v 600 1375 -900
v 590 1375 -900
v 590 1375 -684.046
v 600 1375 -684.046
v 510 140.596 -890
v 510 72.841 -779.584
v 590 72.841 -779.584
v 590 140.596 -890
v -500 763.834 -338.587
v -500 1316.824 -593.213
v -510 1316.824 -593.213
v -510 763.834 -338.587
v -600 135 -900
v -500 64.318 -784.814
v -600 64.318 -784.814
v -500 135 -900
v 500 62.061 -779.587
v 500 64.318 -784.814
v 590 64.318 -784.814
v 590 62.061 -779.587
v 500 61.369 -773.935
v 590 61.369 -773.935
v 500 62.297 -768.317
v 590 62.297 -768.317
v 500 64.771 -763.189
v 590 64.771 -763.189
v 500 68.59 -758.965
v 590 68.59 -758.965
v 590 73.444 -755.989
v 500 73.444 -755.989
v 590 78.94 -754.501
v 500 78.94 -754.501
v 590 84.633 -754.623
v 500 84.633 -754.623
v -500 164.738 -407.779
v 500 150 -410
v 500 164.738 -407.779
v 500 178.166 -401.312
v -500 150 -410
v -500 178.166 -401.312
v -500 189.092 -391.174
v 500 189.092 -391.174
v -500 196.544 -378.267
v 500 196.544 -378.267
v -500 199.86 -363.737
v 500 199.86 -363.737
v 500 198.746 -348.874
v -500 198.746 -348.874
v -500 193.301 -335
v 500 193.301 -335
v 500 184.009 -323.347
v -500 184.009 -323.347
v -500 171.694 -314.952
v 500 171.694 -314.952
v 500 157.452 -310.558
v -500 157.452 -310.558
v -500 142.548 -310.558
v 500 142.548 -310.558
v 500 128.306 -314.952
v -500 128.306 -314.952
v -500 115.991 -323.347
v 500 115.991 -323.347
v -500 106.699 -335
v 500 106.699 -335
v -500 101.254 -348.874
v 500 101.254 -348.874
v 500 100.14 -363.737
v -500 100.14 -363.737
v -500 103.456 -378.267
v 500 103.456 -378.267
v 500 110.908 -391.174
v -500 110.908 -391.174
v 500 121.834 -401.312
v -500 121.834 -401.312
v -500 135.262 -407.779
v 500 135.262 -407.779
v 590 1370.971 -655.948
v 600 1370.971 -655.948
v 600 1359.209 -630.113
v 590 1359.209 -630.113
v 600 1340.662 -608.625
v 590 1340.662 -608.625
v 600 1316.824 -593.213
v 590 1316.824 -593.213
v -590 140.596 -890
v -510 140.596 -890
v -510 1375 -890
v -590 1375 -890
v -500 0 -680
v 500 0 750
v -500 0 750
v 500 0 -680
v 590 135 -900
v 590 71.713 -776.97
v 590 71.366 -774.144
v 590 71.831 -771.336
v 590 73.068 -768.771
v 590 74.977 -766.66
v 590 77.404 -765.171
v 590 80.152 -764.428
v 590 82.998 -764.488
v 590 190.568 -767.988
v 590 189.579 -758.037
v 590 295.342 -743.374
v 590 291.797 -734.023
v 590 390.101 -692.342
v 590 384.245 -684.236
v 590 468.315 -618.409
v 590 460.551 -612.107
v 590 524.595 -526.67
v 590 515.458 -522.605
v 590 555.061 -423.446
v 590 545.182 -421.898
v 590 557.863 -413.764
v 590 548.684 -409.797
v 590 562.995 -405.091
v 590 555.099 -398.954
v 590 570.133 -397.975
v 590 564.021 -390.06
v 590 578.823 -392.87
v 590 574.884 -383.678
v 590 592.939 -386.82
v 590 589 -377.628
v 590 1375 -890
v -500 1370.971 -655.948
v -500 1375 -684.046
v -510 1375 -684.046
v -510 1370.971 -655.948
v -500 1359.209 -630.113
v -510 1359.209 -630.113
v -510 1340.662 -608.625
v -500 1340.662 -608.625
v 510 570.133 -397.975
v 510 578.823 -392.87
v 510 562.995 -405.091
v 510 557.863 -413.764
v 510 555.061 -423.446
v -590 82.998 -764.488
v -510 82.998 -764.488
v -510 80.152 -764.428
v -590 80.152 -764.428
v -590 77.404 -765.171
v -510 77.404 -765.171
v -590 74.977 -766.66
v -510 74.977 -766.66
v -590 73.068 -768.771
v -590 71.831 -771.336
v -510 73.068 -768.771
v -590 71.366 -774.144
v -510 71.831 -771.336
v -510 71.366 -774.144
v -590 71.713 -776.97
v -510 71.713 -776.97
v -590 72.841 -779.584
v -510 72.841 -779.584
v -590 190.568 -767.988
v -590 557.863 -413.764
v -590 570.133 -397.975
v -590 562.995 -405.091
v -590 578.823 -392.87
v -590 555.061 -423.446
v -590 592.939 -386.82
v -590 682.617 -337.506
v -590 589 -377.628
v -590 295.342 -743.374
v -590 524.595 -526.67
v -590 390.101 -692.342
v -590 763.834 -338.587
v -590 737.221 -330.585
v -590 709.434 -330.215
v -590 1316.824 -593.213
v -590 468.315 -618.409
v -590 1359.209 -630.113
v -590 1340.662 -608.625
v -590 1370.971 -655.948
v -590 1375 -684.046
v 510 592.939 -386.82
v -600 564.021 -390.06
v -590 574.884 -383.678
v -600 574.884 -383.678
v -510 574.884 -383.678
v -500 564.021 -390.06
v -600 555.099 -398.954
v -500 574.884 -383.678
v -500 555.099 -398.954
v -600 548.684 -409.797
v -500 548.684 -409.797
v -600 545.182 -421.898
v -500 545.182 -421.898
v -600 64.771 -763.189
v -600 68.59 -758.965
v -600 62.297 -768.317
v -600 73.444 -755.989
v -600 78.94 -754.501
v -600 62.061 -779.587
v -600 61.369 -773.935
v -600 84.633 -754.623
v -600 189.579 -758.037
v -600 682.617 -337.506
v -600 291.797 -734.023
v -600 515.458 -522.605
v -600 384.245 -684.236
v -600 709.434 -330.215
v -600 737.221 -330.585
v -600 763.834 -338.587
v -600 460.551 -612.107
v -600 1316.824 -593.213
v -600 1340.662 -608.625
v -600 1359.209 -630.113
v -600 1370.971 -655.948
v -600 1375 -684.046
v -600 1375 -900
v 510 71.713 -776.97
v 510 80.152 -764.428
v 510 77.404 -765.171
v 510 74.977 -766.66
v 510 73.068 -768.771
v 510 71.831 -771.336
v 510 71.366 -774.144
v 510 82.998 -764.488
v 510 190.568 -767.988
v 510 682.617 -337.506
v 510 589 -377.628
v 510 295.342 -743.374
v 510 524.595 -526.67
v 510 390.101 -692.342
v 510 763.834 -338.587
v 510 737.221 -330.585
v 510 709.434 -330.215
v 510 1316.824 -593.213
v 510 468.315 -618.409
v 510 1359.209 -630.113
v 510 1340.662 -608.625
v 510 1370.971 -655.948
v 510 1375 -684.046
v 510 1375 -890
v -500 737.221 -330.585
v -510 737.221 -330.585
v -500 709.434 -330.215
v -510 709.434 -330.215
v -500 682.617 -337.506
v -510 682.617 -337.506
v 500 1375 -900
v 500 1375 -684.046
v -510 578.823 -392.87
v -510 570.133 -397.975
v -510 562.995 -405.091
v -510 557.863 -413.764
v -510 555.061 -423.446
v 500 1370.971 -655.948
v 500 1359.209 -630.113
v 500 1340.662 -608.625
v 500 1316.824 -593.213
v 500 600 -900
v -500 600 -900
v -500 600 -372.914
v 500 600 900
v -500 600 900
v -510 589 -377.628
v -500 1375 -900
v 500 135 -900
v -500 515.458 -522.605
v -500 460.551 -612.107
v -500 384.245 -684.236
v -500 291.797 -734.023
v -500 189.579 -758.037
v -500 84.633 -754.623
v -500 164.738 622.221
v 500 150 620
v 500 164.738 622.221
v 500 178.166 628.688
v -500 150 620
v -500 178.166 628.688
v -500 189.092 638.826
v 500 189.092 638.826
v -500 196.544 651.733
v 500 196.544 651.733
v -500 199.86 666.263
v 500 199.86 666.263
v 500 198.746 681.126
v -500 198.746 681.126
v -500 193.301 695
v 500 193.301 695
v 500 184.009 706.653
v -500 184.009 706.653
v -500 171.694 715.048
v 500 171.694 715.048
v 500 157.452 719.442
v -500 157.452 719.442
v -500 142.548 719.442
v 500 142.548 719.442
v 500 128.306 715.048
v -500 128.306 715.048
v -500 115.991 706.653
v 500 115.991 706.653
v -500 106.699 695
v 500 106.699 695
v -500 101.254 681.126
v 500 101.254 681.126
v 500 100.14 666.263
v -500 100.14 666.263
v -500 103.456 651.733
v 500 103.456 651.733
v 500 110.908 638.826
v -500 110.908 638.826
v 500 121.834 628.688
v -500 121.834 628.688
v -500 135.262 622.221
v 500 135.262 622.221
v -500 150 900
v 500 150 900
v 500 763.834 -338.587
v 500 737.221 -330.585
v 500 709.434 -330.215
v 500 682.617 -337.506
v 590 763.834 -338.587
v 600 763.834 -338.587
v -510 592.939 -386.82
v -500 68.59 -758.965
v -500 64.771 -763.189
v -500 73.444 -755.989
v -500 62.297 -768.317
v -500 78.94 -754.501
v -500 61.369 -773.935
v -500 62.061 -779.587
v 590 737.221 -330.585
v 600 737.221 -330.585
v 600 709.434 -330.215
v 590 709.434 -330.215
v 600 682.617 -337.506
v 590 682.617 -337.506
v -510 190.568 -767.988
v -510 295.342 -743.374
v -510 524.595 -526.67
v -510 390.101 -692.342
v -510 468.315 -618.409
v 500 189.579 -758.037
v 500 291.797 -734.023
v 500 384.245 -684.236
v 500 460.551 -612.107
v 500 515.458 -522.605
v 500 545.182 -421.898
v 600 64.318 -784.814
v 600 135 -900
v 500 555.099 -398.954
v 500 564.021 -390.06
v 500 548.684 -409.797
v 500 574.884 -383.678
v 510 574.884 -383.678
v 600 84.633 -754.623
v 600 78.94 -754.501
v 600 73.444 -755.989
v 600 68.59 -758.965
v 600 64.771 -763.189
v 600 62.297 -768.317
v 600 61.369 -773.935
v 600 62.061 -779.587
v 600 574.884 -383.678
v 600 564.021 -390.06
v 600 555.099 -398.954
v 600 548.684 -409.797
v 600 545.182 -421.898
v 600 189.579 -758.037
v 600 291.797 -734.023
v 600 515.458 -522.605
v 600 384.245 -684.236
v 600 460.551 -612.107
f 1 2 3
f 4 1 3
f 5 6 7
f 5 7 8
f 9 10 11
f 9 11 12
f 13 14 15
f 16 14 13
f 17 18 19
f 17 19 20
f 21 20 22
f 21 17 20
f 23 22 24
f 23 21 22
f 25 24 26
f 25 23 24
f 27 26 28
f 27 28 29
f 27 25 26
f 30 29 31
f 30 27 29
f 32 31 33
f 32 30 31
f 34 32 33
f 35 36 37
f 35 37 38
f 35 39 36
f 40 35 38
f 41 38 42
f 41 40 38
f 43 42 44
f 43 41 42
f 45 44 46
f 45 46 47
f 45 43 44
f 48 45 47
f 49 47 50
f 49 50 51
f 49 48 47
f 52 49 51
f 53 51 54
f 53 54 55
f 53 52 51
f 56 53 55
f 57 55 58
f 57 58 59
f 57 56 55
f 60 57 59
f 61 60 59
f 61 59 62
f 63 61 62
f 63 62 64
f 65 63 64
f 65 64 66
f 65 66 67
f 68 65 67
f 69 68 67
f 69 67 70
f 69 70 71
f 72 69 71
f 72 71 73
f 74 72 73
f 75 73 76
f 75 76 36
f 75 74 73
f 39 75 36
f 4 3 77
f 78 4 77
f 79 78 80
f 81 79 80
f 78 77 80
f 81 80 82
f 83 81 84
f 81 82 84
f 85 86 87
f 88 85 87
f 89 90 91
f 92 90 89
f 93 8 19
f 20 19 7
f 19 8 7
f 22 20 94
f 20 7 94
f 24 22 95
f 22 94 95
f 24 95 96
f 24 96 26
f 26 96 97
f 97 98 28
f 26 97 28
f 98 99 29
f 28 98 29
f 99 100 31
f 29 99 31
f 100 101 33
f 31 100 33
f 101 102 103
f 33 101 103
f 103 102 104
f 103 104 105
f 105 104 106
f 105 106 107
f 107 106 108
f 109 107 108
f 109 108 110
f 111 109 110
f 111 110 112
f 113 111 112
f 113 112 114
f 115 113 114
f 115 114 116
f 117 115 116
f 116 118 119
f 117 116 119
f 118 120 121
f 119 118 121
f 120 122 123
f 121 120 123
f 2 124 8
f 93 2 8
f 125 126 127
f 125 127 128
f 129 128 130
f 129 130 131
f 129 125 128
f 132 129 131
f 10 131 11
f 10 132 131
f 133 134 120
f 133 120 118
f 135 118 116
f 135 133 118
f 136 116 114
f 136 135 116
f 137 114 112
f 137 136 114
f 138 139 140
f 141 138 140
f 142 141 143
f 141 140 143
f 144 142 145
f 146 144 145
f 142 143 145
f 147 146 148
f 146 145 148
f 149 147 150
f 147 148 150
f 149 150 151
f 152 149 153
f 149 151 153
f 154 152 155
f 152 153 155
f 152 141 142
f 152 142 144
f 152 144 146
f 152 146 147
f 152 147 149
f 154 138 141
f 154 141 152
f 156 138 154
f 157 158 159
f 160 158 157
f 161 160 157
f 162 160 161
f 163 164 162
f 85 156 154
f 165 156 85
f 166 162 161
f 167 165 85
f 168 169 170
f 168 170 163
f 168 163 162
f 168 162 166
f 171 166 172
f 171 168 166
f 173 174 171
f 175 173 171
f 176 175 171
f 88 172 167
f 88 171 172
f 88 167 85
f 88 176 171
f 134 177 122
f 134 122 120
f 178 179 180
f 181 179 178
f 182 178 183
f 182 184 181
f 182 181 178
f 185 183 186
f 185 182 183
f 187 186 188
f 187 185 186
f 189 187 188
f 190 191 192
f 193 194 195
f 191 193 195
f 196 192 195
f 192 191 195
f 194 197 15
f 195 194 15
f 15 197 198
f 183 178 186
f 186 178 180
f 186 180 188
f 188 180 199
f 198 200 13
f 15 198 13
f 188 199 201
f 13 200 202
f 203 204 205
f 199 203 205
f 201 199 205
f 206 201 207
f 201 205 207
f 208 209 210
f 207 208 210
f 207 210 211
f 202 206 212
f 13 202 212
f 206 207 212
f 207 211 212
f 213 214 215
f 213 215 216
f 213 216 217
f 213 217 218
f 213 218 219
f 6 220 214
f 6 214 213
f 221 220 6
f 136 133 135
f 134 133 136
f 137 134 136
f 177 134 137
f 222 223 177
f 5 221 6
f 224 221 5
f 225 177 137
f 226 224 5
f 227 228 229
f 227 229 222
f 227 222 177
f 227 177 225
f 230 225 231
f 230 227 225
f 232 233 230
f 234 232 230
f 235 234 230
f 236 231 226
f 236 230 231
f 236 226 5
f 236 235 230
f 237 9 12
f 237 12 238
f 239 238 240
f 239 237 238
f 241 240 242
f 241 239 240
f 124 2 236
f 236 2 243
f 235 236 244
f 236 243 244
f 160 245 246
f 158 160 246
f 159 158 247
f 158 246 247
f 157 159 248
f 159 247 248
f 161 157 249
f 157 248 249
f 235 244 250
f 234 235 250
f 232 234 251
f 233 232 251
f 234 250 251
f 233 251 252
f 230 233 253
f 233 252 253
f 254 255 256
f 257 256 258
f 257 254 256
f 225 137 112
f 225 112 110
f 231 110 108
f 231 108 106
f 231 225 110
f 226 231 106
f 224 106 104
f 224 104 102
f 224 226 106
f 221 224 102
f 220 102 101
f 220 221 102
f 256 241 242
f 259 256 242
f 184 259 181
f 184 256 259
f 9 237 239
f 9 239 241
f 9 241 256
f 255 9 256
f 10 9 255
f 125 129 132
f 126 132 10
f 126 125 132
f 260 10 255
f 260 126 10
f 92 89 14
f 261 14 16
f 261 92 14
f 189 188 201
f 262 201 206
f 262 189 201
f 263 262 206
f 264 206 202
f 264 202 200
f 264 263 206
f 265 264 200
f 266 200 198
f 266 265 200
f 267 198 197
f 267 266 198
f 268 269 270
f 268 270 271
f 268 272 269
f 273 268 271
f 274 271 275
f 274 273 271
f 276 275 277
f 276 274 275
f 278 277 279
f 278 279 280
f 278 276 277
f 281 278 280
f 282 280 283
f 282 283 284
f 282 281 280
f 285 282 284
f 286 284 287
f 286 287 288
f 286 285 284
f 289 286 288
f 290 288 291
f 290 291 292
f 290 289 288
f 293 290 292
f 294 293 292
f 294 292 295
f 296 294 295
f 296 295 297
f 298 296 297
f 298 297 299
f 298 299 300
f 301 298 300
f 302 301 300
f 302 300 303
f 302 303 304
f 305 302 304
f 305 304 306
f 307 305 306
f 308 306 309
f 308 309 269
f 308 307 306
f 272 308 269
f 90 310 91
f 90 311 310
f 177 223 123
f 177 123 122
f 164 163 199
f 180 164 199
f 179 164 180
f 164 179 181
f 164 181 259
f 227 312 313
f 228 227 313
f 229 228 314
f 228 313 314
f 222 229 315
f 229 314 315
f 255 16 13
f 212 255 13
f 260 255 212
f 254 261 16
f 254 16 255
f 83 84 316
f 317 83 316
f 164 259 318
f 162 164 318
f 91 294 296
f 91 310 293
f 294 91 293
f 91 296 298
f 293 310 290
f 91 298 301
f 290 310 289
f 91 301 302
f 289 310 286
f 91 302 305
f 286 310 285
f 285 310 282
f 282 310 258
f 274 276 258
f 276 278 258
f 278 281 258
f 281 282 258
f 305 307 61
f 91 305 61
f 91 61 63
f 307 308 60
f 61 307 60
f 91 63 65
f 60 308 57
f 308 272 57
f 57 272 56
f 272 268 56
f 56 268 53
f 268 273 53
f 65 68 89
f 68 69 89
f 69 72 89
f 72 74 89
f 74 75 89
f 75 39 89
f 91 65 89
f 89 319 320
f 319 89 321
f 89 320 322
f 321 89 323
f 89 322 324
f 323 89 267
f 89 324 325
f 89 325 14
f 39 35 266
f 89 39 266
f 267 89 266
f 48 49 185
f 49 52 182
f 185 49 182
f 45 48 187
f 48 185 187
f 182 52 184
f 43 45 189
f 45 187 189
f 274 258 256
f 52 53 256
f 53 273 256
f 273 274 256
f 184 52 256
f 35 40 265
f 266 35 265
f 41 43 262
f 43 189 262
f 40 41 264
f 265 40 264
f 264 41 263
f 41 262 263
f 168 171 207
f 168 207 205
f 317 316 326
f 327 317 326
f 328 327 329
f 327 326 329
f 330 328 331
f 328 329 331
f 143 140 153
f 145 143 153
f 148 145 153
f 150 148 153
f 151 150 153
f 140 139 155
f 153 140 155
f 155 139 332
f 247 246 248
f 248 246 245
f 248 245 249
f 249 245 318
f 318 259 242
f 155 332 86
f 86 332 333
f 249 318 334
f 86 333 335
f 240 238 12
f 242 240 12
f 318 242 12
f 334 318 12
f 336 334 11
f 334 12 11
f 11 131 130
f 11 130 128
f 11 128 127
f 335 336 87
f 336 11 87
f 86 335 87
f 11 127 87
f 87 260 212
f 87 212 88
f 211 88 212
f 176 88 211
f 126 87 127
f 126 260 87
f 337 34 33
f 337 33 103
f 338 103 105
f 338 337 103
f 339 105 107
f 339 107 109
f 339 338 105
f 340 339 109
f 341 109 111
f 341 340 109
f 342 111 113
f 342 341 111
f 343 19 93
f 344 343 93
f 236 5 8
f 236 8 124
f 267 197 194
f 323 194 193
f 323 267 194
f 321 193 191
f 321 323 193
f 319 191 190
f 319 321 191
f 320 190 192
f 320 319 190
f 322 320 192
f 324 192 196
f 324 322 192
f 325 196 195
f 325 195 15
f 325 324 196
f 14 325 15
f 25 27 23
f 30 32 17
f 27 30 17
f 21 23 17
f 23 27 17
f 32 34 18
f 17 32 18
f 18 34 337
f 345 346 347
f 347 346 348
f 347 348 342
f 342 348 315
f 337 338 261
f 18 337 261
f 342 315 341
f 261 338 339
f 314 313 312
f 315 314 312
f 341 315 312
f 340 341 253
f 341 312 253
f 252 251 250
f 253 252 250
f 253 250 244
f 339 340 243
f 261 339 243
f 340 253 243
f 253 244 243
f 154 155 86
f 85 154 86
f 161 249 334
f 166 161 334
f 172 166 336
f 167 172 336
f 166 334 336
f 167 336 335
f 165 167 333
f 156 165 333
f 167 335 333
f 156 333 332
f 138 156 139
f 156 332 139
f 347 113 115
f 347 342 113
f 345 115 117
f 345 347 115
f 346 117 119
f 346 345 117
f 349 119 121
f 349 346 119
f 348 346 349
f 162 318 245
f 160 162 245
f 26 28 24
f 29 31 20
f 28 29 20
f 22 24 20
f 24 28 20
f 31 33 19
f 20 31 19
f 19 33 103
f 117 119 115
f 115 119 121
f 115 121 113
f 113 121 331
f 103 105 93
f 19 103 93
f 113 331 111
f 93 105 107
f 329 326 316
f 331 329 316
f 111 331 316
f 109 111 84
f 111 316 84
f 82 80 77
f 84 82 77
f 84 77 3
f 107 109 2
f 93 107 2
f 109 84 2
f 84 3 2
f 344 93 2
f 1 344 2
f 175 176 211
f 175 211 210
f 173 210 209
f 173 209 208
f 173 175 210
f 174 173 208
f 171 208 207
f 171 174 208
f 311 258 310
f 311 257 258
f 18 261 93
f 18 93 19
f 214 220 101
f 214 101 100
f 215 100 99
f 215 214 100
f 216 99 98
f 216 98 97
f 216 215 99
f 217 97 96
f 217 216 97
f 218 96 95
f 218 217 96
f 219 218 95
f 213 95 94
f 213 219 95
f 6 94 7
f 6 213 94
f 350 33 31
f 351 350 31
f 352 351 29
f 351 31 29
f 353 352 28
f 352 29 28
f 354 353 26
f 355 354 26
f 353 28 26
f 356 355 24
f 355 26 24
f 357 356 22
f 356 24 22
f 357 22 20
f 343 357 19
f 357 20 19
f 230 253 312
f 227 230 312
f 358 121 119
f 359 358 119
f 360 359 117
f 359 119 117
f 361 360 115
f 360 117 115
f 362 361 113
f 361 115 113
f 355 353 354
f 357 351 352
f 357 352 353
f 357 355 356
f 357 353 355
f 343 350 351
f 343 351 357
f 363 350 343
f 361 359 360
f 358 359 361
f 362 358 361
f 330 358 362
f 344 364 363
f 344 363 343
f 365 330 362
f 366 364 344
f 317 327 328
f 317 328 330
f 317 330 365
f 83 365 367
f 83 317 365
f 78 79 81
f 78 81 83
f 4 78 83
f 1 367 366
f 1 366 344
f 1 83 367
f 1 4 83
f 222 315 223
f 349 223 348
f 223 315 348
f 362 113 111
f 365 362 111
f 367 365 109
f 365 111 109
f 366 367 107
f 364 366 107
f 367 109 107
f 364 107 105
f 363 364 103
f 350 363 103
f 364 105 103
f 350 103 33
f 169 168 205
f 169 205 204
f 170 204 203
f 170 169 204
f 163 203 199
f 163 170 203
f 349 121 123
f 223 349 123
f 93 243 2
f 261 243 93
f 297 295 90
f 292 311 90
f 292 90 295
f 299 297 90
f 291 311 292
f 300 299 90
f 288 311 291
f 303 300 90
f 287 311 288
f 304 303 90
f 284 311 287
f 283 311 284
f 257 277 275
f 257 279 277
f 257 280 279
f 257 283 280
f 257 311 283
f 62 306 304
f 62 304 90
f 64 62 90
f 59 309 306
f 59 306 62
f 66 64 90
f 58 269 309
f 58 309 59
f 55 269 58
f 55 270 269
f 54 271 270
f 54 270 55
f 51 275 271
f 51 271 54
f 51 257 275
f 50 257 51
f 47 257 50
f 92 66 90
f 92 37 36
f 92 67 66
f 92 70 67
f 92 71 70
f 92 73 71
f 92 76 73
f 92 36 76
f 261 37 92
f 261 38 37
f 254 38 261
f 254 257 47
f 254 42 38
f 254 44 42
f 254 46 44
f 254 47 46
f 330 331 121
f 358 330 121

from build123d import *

# Parameters (mm, degrees)
SKETCH2_R           = 50
BOSS_EXTRUDE1_DEPTH = 500
BOSS_EXTRUDE2_DEPTH = 10
BOSS_EXTRUDE3_DEPTH = 80
BOSS_EXTRUDE4_START = 90
BOSS_EXTRUDE4_DEPTH = 10


with BuildPart() as part:
    # Sketch2 → Boss-Extrude1 (new, symmetric)
    with BuildSketch(Plane(origin=(0, 0, 0), x_dir=(0, 0, -1), z_dir=(1, 0, 0))):
        Polygon((-750, 0), (680, 0), (900, 135), (900, 600), (-900, 600), (-900, 150), align=None)
        with Locations((-670, 150)):
            Circle(SKETCH2_R, mode=Mode.SUBTRACT)
        with Locations((360, 150)):
            Circle(SKETCH2_R, mode=Mode.SUBTRACT)
    extrude(amount=BOSS_EXTRUDE1_DEPTH, both=True)


with BuildPart() as body_2:
    # Sketch3 → Boss-Extrude2 (new body)
    with BuildSketch(Plane(origin=(500, 0, 0), x_dir=(0, 0, -1), z_dir=(1, 0, 0))):
        with BuildLine():
            Line((900, 135), (900, 1375))
            Line((900, 1375), (684.046420048, 1375))
            ThreePointArc((684.046420048, 1375), (630.113322029, 1359.20938747), (593.212957077, 1316.824418761))
            Line((593.212957077, 1316.824418761), (338.587493201, 763.833765708))
            ThreePointArc((338.587493201, 763.833765708), (329.429813626, 723.340291143), (337.50645317, 682.617417089))
            Line((337.50645317, 682.617417089), (383.67812534, 574.883515358))
            ThreePointArc((383.67812534, 574.883515358), (398.954375956, 555.099407026), (421.898112747, 545.181760255))
            ThreePointArc((421.898112747, 545.181760255), (684.23633033, 384.245175178), (754.622739752, 84.632628396))
            ThreePointArc((754.622739752, 84.632628396), (763.188752403, 64.770887689), (784.814201137, 64.317805243))
            Line((784.814201137, 64.317805243), (900, 135))
        make_face()
    boss_extrude2 = extrude(amount=BOSS_EXTRUDE2_DEPTH)

    # Sketch4 → Boss-Extrude3 (add)
    with BuildSketch(Plane(origin=(510, 0, 0), x_dir=(0, 0, -1), z_dir=(1, 0, 0))):
        with BuildLine():
            Line((377.628203351, 589), (386.819653651, 592.939192986))
            Line((386.819653651, 592.939192986), (392.86957564, 578.822708344))
            ThreePointArc((392.86957564, 578.822708344), (405.090576133, 562.995421678), (423.445565566, 555.061304261))
            ThreePointArc((423.445565566, 555.061304261), (692.342238588, 390.101304558), (764.488308246, 82.998444106))
            ThreePointArc((764.488308246, 82.998444106), (768.771314571, 73.067573753), (779.584038938, 72.84103253))
            Line((779.584038938, 72.84103253), (890, 140.596281363))
            Line((890, 140.596281363), (890, 1375))
            Line((890, 1375), (900, 1375))
            Line((900, 1375), (900, 135))
            Line((900, 135), (784.814201137, 64.317805243))
            ThreePointArc((784.814201137, 64.317805243), (763.188752403, 64.770887689), (754.622739752, 84.632628396))
            ThreePointArc((754.622739752, 84.632628396), (684.23633033, 384.245175178), (421.898112747, 545.181760255))
            ThreePointArc((421.898112747, 545.181760255), (398.954375956, 555.099407026), (383.67812534, 574.883515358))
            Line((383.67812534, 574.883515358), (377.628203351, 589))
        make_face()
    boss_extrude3 = extrude(amount=BOSS_EXTRUDE3_DEPTH)


with BuildPart() as body_3:
    # Sketch3<2> → Boss-Extrude4 (new body)
    with BuildSketch(Plane(origin=(500, 0, 0), x_dir=(0, 0, -1), z_dir=(1, 0, 0)).offset(BOSS_EXTRUDE4_START)):
        with BuildLine():
            Line((900, 135), (900, 1375))
            Line((900, 1375), (684.046420048, 1375))
            ThreePointArc((684.046420048, 1375), (630.113322029, 1359.20938747), (593.212957077, 1316.824418761))
            Line((593.212957077, 1316.824418761), (338.587493201, 763.833765708))
            ThreePointArc((338.587493201, 763.833765708), (329.429813626, 723.340291143), (337.50645317, 682.617417089))
            Line((337.50645317, 682.617417089), (383.67812534, 574.883515358))
            ThreePointArc((383.67812534, 574.883515358), (398.954375956, 555.099407026), (421.898112747, 545.181760255))
            ThreePointArc((421.898112747, 545.181760255), (684.23633033, 384.245175178), (754.622739752, 84.632628396))
            ThreePointArc((754.622739752, 84.632628396), (763.188752403, 64.770887689), (784.814201137, 64.317805243))
            Line((784.814201137, 64.317805243), (900, 135))
        make_face()
    boss_extrude4 = extrude(amount=BOSS_EXTRUDE4_DEPTH)


with BuildPart() as part_1:
    add(part.part)

    # Mirror1: Boss-Extrude2, Boss-Extrude3, Boss-Extrude4 across plane
    add(boss_extrude2.mirror(Plane(origin=(0, 0, 0), x_dir=(0, 0, 1), z_dir=(1, 0, 0))))
    add(boss_extrude3.mirror(Plane(origin=(0, 0, 0), x_dir=(0, 0, 1), z_dir=(1, 0, 0))))
    add(boss_extrude4.mirror(Plane(origin=(0, 0, 0), x_dir=(0, 0, 1), z_dir=(1, 0, 0))))


solid = Compound([body_2.part, body_3.part, part_1.part])
